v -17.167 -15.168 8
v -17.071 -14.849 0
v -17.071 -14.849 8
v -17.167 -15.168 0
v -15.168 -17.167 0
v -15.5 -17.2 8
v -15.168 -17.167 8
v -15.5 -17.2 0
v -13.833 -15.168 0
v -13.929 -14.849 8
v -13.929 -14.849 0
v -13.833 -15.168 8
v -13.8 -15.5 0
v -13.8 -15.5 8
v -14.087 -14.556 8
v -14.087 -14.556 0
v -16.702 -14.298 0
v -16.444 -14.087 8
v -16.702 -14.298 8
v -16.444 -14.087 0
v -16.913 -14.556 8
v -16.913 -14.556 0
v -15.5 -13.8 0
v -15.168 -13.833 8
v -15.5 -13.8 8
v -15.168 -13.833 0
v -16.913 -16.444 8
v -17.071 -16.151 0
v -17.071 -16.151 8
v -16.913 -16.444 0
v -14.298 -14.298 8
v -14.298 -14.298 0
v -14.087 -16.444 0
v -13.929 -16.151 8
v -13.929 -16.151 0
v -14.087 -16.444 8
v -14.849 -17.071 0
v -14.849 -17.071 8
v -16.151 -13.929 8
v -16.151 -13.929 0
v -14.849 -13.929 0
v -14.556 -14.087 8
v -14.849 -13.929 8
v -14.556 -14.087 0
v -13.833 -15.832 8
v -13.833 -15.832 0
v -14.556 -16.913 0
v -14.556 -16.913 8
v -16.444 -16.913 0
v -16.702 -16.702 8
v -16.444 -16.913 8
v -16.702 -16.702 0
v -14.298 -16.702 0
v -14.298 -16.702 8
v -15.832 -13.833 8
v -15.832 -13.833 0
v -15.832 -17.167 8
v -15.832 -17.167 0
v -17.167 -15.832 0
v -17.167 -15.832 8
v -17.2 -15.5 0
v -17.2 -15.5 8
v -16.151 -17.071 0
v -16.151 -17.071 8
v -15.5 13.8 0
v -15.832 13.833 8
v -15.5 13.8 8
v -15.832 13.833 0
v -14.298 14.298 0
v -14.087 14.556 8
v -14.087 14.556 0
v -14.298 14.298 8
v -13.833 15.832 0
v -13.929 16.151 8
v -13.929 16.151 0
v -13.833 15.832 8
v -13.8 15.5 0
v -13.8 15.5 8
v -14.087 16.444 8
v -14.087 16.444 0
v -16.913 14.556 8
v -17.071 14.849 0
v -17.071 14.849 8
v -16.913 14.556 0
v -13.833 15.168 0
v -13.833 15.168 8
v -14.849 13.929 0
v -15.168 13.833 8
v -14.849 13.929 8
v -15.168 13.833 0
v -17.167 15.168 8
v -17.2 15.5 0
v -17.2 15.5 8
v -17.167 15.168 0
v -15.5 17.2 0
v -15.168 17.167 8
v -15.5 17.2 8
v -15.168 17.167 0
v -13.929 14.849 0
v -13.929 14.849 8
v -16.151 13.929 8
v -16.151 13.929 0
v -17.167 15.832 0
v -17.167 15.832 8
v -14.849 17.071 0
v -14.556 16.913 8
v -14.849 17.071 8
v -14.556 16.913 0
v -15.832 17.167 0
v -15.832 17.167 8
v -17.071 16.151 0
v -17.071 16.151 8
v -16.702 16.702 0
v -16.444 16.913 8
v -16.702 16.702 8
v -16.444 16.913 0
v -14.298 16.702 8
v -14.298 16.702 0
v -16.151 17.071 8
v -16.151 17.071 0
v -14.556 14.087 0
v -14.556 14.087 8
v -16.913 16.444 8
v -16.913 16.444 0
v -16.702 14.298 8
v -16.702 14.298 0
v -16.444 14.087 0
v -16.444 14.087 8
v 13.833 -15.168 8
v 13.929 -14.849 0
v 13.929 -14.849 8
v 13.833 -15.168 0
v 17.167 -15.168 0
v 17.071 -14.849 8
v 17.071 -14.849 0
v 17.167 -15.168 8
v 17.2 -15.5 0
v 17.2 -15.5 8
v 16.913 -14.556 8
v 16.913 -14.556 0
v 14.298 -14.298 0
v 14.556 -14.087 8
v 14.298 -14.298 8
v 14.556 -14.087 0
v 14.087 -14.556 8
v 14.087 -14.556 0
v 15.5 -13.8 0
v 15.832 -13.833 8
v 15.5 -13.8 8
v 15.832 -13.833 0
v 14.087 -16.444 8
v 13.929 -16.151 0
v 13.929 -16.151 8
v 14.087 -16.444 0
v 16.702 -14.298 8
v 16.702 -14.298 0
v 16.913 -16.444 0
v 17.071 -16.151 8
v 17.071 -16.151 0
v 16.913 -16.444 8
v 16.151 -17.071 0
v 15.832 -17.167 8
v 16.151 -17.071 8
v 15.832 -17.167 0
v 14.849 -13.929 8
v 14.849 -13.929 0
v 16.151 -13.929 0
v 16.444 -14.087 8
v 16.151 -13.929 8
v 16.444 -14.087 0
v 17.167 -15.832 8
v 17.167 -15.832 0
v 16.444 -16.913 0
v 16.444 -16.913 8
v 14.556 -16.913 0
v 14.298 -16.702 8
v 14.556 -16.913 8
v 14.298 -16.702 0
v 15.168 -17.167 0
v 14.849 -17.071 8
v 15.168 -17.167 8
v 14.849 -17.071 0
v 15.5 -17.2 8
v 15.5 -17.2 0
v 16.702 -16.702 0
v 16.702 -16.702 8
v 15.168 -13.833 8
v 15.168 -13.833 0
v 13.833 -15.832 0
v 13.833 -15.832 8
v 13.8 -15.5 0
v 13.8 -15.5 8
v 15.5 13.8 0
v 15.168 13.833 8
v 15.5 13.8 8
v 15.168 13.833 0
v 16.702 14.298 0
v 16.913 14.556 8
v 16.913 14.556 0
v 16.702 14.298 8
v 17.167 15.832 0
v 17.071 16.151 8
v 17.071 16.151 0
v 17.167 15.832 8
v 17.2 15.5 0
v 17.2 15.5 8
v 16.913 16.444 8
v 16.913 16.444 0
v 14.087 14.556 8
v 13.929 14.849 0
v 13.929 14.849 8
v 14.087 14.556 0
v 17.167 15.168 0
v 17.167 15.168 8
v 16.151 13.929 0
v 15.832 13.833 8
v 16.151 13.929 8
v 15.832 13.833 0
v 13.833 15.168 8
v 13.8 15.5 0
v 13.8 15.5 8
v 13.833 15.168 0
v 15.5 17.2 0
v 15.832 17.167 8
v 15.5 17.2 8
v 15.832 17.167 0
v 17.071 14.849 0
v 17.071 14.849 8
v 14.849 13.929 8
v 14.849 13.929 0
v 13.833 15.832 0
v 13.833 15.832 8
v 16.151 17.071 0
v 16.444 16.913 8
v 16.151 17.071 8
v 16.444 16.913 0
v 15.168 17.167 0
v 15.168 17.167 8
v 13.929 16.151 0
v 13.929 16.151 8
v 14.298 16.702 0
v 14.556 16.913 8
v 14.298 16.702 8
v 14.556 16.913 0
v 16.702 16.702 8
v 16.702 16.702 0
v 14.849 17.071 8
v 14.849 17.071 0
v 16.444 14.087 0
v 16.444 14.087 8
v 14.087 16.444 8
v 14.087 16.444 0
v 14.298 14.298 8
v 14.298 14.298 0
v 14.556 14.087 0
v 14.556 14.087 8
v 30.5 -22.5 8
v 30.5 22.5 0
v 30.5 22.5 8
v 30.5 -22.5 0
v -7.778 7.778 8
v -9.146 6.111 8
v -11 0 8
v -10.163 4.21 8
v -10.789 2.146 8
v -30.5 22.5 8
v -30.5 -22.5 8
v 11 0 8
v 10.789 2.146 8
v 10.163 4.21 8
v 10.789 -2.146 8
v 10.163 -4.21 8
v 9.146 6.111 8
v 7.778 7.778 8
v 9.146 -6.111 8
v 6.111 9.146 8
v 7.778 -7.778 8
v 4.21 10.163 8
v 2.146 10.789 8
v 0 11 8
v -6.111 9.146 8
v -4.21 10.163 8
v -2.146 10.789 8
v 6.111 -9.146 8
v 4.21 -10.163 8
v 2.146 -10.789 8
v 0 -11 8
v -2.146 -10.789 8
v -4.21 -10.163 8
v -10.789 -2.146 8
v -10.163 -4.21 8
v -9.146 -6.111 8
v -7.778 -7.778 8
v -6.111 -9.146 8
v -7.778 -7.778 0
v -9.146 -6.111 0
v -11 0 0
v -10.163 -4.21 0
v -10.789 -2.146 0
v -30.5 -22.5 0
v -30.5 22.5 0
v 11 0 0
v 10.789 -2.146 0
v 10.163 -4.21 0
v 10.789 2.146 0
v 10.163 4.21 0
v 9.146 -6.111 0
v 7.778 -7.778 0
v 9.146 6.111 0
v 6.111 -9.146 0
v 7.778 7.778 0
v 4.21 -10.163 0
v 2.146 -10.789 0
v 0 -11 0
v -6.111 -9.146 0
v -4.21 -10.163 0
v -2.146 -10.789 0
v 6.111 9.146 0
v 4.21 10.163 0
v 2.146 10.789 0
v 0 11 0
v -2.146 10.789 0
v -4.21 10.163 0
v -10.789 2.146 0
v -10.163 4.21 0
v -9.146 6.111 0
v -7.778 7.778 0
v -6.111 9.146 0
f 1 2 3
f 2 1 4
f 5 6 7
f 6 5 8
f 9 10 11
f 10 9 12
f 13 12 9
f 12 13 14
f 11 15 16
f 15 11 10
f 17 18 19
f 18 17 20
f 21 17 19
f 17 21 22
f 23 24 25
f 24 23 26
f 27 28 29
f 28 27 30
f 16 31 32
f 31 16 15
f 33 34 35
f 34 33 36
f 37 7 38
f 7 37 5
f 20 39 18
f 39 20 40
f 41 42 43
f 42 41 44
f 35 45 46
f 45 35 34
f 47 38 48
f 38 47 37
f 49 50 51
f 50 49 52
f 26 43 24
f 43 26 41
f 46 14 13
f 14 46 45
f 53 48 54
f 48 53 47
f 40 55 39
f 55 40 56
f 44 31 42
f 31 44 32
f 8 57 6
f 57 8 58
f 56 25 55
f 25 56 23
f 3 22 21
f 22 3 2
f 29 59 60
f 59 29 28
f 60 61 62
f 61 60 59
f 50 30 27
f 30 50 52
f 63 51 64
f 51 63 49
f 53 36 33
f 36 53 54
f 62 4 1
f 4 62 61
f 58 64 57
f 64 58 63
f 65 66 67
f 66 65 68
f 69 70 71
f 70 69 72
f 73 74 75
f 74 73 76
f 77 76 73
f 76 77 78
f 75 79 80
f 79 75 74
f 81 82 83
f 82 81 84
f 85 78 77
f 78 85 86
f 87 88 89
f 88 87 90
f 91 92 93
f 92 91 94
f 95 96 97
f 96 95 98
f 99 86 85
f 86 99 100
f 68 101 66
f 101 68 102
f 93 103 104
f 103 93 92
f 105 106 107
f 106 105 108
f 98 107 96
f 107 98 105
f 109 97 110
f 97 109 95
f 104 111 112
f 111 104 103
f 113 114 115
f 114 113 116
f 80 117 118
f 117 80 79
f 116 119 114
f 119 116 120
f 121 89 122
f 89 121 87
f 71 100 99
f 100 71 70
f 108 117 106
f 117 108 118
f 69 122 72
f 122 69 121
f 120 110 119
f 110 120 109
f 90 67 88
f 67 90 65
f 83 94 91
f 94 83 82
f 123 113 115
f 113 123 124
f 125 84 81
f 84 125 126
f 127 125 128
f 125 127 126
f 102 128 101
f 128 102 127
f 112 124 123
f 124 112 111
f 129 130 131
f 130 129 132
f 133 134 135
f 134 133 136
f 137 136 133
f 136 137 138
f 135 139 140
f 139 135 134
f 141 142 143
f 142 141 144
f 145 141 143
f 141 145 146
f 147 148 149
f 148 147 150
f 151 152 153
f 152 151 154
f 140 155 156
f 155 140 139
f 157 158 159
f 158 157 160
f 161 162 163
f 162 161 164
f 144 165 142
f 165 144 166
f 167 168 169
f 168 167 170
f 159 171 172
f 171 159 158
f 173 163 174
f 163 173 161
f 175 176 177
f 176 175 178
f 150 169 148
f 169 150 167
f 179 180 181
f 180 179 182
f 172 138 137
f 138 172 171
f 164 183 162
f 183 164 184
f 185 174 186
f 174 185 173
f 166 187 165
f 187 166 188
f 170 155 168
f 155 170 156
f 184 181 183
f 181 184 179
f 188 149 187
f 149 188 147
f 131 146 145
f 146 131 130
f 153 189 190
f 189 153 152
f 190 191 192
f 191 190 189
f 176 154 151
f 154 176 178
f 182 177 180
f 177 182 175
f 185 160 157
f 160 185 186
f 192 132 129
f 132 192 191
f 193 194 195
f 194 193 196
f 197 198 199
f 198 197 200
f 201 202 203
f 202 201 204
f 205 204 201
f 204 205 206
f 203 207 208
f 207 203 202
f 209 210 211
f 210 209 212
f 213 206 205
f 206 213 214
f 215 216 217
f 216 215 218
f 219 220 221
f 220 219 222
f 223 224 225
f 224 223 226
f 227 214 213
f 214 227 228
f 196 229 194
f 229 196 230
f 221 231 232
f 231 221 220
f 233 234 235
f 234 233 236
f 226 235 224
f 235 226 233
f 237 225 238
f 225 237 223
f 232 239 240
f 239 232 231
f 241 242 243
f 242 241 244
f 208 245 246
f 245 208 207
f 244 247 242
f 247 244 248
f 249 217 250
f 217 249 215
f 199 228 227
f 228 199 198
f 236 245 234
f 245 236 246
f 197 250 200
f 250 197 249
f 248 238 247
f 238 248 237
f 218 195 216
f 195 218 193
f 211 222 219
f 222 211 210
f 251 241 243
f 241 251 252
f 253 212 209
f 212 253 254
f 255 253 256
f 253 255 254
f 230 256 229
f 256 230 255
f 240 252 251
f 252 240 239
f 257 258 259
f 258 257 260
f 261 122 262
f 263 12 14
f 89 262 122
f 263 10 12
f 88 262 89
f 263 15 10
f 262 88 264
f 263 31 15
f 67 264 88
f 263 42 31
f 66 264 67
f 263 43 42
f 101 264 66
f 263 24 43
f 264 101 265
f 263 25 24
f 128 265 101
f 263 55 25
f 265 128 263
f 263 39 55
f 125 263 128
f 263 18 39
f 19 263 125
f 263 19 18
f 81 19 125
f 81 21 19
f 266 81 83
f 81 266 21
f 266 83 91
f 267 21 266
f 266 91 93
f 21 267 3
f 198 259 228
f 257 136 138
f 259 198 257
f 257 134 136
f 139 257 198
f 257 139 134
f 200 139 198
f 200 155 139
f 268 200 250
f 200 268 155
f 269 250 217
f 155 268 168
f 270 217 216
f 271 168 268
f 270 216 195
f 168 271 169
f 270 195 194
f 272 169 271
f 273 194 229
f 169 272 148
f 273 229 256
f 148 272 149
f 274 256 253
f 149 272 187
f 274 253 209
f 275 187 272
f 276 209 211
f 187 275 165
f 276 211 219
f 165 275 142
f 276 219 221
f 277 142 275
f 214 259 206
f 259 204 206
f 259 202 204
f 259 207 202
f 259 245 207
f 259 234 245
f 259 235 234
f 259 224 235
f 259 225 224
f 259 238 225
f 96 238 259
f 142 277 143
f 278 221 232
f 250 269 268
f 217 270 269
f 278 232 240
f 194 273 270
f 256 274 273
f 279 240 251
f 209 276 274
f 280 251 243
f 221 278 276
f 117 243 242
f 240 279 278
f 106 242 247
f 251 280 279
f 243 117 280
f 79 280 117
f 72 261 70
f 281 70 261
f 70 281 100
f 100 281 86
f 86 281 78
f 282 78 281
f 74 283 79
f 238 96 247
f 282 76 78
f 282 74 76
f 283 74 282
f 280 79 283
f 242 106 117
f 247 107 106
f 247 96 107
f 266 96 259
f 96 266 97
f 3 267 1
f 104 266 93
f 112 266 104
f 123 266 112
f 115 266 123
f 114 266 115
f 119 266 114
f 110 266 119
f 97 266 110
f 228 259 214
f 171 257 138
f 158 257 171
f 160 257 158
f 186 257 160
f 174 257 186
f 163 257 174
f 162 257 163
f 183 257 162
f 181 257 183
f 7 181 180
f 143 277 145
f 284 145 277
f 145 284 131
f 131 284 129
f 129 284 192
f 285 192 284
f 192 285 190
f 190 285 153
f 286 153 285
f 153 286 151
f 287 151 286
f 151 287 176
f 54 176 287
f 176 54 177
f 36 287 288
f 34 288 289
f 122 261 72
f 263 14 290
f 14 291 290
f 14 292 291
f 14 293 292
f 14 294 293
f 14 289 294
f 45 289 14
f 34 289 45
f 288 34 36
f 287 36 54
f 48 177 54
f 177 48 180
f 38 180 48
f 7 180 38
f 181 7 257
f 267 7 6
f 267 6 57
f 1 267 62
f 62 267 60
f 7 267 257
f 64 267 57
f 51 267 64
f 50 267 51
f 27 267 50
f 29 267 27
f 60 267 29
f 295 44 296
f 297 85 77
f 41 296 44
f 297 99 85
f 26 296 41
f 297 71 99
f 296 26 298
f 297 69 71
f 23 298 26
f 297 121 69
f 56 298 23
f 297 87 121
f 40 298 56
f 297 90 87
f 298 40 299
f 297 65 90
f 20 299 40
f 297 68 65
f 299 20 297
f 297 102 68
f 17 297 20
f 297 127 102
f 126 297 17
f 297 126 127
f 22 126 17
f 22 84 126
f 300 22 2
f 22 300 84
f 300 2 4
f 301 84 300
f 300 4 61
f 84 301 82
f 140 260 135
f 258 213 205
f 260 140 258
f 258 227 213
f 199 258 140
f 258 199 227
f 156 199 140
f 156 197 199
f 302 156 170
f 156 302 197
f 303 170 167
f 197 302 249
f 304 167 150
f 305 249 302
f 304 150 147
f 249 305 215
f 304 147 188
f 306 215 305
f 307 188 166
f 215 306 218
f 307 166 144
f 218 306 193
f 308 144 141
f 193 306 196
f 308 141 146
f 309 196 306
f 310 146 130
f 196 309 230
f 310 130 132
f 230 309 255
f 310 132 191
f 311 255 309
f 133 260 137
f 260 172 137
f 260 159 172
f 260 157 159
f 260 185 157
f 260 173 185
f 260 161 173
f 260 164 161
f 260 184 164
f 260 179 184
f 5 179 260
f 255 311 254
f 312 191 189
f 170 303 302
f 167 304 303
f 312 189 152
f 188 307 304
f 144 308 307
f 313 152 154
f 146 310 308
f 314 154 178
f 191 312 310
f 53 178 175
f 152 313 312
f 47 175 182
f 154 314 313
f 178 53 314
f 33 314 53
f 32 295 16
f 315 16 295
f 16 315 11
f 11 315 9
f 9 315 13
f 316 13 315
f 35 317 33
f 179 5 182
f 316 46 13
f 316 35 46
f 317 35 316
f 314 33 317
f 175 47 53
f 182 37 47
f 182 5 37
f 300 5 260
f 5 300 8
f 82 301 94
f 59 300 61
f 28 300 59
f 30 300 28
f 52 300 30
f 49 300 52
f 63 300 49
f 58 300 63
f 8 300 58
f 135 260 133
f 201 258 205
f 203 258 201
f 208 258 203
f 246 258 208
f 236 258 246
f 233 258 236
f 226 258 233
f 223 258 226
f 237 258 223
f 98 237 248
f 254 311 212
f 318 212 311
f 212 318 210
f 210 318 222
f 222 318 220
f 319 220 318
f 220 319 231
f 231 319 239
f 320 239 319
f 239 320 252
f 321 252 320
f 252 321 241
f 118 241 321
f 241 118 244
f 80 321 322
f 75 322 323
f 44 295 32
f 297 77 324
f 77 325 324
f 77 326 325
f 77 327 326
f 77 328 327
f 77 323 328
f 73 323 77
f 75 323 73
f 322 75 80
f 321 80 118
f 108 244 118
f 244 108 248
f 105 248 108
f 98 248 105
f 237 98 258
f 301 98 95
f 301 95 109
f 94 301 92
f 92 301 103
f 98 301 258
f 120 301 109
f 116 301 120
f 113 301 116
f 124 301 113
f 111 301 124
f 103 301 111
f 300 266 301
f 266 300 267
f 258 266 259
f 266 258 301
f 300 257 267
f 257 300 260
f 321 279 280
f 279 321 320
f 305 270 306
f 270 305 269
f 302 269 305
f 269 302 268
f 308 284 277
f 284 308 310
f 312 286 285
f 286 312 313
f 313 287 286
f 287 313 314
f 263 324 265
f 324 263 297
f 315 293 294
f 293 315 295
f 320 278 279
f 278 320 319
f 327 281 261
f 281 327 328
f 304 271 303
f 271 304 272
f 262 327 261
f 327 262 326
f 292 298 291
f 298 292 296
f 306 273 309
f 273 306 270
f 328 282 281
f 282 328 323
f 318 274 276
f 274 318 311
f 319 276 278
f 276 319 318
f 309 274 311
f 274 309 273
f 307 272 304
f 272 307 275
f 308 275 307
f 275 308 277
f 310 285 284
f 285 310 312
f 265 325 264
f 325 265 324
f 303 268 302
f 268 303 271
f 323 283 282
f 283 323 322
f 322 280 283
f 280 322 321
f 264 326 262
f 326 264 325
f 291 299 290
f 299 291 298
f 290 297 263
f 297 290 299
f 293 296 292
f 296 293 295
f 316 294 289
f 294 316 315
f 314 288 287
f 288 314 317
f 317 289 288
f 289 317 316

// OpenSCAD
$fn = 32;

// ----------------------------------------------------------------------
// Motor mount plate: NEMA17, 61 x 45 x 8 mm
// ----------------------------------------------------------------------

// --- parameters (mm) ---
plate_w = 61;             // plate length, X
plate_d = 45;             // plate width, Y
plate_t = 8;              // plate thickness
pattern = 31;             // NEMA17 bolt spacing
motor_d = 3.4;            // NEMA17 screw clearance
pilot_d = 22;             // pilot boss bore

module plate() {
  translate([-plate_w / 2, -plate_d / 2, 0]) cube([plate_w, plate_d, plate_t]);
}

module motor_holes() {
  for (sx = [-1, 1]) for (sy = [-1, 1])
    translate([sx * pattern / 2, sy * pattern / 2, -1])
      cylinder(h = plate_t + 2, d = motor_d);
}

difference() {
  union() {
    plate();
  }
  motor_holes();
  translate([0, 0, -1]) cylinder(h = plate_t + 2, d = pilot_d);
}
